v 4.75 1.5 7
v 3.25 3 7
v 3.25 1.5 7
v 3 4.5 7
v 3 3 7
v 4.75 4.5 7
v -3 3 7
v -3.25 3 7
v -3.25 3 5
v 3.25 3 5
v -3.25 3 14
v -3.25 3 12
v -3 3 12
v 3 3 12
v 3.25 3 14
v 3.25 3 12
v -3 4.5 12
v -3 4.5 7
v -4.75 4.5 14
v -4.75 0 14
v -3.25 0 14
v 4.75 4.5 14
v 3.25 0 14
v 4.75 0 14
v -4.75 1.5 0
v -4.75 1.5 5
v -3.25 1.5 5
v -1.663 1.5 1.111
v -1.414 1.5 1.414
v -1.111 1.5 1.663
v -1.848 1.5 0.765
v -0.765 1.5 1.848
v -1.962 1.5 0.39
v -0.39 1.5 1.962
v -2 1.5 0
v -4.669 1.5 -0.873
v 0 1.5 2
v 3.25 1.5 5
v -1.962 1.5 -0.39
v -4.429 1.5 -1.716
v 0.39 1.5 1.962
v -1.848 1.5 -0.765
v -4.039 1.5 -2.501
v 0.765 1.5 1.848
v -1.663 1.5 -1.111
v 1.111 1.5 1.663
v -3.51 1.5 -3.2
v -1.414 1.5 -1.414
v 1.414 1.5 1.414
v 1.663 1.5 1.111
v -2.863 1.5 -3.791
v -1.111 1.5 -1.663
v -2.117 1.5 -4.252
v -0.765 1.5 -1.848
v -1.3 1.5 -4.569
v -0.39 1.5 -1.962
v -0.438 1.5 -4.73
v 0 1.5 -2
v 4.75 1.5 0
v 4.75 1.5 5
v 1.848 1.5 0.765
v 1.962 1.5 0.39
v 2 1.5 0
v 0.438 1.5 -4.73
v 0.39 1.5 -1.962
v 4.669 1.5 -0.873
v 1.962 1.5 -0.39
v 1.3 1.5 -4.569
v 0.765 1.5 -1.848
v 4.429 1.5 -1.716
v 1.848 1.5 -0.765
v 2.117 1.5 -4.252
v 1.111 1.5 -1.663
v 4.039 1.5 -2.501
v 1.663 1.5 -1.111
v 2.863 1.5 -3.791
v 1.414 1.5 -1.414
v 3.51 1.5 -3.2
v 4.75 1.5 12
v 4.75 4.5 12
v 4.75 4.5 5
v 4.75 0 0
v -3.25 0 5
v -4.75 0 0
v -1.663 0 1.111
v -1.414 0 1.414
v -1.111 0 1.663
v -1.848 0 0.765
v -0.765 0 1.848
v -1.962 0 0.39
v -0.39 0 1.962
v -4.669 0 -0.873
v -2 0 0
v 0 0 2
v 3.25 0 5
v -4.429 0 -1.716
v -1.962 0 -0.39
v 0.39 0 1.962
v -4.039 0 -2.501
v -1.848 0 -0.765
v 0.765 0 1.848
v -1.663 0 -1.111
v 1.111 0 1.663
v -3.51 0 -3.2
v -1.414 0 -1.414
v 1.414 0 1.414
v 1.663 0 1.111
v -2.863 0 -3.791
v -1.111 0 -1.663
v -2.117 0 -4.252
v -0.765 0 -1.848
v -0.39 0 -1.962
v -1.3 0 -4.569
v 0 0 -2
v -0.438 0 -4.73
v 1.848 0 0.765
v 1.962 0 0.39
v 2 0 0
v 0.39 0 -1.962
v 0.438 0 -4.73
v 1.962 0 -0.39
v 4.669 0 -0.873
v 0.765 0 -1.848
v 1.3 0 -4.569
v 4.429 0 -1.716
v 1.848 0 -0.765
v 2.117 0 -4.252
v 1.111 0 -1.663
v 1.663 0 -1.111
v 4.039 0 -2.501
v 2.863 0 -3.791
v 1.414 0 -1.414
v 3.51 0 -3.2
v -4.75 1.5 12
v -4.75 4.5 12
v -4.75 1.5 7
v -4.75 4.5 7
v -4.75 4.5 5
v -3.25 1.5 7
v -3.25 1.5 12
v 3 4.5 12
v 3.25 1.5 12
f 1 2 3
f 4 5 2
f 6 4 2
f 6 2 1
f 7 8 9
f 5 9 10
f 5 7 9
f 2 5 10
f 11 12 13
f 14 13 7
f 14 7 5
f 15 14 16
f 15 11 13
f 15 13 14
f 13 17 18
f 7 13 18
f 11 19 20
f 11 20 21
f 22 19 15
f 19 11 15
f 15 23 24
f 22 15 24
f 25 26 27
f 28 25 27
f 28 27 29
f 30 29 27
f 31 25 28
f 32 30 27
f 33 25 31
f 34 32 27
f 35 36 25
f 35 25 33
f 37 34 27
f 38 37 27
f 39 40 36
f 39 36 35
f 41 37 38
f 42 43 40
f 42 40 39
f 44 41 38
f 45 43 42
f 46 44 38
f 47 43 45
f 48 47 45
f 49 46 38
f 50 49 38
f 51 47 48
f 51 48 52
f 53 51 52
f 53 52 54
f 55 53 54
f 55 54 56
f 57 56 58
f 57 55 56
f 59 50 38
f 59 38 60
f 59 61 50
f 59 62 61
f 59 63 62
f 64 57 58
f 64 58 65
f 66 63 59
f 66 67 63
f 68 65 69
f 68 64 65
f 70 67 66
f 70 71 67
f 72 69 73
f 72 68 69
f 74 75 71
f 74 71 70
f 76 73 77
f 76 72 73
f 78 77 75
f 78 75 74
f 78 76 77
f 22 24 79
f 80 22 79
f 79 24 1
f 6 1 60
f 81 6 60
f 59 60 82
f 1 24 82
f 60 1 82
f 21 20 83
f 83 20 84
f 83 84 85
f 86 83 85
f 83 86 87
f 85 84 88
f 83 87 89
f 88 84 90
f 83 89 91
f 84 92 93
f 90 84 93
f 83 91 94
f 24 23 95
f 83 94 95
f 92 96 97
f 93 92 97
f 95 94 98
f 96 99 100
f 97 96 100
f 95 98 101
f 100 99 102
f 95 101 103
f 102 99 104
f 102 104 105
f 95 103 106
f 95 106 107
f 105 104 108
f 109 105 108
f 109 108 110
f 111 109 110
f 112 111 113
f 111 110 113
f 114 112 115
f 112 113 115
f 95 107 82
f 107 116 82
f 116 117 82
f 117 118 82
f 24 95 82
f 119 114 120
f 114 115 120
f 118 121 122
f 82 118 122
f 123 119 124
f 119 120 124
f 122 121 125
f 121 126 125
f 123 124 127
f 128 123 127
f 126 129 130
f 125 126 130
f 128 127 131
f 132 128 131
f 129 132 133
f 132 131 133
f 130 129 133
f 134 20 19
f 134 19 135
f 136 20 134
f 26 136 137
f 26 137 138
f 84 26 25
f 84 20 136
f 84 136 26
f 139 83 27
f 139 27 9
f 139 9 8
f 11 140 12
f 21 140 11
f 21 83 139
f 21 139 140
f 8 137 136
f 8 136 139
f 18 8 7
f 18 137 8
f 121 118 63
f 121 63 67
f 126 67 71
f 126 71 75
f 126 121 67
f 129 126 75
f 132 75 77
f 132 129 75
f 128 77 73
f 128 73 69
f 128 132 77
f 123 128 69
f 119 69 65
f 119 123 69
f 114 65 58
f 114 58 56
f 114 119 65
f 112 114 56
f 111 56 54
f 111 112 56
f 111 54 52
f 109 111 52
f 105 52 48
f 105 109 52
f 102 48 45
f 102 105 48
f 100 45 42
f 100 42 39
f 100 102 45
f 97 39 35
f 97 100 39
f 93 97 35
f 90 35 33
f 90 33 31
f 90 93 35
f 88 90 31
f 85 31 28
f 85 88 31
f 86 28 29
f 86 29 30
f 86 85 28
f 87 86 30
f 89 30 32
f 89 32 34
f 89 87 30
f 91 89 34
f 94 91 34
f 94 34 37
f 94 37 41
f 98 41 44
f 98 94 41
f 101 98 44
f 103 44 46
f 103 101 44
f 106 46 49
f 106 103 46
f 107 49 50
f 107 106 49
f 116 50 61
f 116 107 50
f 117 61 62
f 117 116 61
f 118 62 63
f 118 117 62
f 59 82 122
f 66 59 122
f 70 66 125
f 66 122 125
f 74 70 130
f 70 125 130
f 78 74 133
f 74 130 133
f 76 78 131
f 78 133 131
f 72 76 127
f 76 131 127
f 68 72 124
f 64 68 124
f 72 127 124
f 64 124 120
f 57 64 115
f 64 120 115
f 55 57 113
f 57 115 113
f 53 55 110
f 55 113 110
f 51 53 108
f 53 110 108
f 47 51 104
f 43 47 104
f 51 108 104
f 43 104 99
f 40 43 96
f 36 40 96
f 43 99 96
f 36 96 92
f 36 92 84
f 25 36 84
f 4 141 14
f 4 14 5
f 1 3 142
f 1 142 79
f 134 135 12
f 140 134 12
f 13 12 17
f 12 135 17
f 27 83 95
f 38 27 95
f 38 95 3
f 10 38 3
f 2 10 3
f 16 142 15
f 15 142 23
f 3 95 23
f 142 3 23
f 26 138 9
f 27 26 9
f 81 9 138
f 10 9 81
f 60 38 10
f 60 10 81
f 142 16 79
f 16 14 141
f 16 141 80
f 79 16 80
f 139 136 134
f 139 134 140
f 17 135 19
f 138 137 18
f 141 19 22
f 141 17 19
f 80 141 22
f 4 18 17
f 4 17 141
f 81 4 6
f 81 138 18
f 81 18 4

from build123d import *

# Parameters (mm, degrees)
SKETCH_1_R          = 2
EXTRUDE_1_DEPTH     = 1.5
SKETCH_2_W          = 9.5
SKETCH_2_H          = 9
EXTRUDE_2_DEPTH     = 3
SKETCH_3_W          = 6.5
SKETCH_3_H          = 9
CUT_EXTRUDE_1_DEPTH = 3
SKETCH_4_W          = 1.75
SKETCH_4_H          = 5
CUT_EXTRUDE_2_DEPTH = 3


with BuildPart() as part:
    # 草图1 → 凸台-拉伸1 (new body)
    with BuildSketch(Plane(origin=(0, 0, 0), x_dir=(1, 0, 0), z_dir=(0, 1, 0))):
        with BuildLine():
            Line((-4.75, 0), (-4.75, -14))
            Line((-4.75, -14), (4.75, -14))
            Line((4.75, -14), (4.75, 0))
            ThreePointArc((4.75, 0), (0, 4.75), (-4.75, 0))
        make_face()
        Circle(SKETCH_1_R, mode=Mode.SUBTRACT)
    extrude(amount=EXTRUDE_1_DEPTH)

    # 草图2 → 凸台-拉伸2 (add)
    with BuildSketch(Plane(origin=(0, 1.5, 0), x_dir=(1, 0, 0), z_dir=(0, 1, 0))):
        with Locations((0, -9.5)):
            Rectangle(SKETCH_2_W, SKETCH_2_H)
    extrude(amount=EXTRUDE_2_DEPTH)

    # 草图3 → 切除-拉伸1 (cut)
    with BuildSketch(Plane.XZ):
        with Locations((0, 9.5)):
            Rectangle(SKETCH_3_W, SKETCH_3_H)
    extrude(amount=-CUT_EXTRUDE_1_DEPTH, mode=Mode.SUBTRACT)

    # 草图4 → 切除-拉伸2 (cut)
    with BuildSketch(Plane(origin=(0, 4.5, 0), x_dir=(1, 0, 0), z_dir=(0, 1, 0))):
        with Locations((-3.875, -9.5)):
            Rectangle(SKETCH_4_W, SKETCH_4_H)
        with Locations((3.875, -9.5)):
            Rectangle(SKETCH_4_W, SKETCH_4_H)
    extrude(amount=-CUT_EXTRUDE_2_DEPTH, mode=Mode.SUBTRACT)


solid = part.part
